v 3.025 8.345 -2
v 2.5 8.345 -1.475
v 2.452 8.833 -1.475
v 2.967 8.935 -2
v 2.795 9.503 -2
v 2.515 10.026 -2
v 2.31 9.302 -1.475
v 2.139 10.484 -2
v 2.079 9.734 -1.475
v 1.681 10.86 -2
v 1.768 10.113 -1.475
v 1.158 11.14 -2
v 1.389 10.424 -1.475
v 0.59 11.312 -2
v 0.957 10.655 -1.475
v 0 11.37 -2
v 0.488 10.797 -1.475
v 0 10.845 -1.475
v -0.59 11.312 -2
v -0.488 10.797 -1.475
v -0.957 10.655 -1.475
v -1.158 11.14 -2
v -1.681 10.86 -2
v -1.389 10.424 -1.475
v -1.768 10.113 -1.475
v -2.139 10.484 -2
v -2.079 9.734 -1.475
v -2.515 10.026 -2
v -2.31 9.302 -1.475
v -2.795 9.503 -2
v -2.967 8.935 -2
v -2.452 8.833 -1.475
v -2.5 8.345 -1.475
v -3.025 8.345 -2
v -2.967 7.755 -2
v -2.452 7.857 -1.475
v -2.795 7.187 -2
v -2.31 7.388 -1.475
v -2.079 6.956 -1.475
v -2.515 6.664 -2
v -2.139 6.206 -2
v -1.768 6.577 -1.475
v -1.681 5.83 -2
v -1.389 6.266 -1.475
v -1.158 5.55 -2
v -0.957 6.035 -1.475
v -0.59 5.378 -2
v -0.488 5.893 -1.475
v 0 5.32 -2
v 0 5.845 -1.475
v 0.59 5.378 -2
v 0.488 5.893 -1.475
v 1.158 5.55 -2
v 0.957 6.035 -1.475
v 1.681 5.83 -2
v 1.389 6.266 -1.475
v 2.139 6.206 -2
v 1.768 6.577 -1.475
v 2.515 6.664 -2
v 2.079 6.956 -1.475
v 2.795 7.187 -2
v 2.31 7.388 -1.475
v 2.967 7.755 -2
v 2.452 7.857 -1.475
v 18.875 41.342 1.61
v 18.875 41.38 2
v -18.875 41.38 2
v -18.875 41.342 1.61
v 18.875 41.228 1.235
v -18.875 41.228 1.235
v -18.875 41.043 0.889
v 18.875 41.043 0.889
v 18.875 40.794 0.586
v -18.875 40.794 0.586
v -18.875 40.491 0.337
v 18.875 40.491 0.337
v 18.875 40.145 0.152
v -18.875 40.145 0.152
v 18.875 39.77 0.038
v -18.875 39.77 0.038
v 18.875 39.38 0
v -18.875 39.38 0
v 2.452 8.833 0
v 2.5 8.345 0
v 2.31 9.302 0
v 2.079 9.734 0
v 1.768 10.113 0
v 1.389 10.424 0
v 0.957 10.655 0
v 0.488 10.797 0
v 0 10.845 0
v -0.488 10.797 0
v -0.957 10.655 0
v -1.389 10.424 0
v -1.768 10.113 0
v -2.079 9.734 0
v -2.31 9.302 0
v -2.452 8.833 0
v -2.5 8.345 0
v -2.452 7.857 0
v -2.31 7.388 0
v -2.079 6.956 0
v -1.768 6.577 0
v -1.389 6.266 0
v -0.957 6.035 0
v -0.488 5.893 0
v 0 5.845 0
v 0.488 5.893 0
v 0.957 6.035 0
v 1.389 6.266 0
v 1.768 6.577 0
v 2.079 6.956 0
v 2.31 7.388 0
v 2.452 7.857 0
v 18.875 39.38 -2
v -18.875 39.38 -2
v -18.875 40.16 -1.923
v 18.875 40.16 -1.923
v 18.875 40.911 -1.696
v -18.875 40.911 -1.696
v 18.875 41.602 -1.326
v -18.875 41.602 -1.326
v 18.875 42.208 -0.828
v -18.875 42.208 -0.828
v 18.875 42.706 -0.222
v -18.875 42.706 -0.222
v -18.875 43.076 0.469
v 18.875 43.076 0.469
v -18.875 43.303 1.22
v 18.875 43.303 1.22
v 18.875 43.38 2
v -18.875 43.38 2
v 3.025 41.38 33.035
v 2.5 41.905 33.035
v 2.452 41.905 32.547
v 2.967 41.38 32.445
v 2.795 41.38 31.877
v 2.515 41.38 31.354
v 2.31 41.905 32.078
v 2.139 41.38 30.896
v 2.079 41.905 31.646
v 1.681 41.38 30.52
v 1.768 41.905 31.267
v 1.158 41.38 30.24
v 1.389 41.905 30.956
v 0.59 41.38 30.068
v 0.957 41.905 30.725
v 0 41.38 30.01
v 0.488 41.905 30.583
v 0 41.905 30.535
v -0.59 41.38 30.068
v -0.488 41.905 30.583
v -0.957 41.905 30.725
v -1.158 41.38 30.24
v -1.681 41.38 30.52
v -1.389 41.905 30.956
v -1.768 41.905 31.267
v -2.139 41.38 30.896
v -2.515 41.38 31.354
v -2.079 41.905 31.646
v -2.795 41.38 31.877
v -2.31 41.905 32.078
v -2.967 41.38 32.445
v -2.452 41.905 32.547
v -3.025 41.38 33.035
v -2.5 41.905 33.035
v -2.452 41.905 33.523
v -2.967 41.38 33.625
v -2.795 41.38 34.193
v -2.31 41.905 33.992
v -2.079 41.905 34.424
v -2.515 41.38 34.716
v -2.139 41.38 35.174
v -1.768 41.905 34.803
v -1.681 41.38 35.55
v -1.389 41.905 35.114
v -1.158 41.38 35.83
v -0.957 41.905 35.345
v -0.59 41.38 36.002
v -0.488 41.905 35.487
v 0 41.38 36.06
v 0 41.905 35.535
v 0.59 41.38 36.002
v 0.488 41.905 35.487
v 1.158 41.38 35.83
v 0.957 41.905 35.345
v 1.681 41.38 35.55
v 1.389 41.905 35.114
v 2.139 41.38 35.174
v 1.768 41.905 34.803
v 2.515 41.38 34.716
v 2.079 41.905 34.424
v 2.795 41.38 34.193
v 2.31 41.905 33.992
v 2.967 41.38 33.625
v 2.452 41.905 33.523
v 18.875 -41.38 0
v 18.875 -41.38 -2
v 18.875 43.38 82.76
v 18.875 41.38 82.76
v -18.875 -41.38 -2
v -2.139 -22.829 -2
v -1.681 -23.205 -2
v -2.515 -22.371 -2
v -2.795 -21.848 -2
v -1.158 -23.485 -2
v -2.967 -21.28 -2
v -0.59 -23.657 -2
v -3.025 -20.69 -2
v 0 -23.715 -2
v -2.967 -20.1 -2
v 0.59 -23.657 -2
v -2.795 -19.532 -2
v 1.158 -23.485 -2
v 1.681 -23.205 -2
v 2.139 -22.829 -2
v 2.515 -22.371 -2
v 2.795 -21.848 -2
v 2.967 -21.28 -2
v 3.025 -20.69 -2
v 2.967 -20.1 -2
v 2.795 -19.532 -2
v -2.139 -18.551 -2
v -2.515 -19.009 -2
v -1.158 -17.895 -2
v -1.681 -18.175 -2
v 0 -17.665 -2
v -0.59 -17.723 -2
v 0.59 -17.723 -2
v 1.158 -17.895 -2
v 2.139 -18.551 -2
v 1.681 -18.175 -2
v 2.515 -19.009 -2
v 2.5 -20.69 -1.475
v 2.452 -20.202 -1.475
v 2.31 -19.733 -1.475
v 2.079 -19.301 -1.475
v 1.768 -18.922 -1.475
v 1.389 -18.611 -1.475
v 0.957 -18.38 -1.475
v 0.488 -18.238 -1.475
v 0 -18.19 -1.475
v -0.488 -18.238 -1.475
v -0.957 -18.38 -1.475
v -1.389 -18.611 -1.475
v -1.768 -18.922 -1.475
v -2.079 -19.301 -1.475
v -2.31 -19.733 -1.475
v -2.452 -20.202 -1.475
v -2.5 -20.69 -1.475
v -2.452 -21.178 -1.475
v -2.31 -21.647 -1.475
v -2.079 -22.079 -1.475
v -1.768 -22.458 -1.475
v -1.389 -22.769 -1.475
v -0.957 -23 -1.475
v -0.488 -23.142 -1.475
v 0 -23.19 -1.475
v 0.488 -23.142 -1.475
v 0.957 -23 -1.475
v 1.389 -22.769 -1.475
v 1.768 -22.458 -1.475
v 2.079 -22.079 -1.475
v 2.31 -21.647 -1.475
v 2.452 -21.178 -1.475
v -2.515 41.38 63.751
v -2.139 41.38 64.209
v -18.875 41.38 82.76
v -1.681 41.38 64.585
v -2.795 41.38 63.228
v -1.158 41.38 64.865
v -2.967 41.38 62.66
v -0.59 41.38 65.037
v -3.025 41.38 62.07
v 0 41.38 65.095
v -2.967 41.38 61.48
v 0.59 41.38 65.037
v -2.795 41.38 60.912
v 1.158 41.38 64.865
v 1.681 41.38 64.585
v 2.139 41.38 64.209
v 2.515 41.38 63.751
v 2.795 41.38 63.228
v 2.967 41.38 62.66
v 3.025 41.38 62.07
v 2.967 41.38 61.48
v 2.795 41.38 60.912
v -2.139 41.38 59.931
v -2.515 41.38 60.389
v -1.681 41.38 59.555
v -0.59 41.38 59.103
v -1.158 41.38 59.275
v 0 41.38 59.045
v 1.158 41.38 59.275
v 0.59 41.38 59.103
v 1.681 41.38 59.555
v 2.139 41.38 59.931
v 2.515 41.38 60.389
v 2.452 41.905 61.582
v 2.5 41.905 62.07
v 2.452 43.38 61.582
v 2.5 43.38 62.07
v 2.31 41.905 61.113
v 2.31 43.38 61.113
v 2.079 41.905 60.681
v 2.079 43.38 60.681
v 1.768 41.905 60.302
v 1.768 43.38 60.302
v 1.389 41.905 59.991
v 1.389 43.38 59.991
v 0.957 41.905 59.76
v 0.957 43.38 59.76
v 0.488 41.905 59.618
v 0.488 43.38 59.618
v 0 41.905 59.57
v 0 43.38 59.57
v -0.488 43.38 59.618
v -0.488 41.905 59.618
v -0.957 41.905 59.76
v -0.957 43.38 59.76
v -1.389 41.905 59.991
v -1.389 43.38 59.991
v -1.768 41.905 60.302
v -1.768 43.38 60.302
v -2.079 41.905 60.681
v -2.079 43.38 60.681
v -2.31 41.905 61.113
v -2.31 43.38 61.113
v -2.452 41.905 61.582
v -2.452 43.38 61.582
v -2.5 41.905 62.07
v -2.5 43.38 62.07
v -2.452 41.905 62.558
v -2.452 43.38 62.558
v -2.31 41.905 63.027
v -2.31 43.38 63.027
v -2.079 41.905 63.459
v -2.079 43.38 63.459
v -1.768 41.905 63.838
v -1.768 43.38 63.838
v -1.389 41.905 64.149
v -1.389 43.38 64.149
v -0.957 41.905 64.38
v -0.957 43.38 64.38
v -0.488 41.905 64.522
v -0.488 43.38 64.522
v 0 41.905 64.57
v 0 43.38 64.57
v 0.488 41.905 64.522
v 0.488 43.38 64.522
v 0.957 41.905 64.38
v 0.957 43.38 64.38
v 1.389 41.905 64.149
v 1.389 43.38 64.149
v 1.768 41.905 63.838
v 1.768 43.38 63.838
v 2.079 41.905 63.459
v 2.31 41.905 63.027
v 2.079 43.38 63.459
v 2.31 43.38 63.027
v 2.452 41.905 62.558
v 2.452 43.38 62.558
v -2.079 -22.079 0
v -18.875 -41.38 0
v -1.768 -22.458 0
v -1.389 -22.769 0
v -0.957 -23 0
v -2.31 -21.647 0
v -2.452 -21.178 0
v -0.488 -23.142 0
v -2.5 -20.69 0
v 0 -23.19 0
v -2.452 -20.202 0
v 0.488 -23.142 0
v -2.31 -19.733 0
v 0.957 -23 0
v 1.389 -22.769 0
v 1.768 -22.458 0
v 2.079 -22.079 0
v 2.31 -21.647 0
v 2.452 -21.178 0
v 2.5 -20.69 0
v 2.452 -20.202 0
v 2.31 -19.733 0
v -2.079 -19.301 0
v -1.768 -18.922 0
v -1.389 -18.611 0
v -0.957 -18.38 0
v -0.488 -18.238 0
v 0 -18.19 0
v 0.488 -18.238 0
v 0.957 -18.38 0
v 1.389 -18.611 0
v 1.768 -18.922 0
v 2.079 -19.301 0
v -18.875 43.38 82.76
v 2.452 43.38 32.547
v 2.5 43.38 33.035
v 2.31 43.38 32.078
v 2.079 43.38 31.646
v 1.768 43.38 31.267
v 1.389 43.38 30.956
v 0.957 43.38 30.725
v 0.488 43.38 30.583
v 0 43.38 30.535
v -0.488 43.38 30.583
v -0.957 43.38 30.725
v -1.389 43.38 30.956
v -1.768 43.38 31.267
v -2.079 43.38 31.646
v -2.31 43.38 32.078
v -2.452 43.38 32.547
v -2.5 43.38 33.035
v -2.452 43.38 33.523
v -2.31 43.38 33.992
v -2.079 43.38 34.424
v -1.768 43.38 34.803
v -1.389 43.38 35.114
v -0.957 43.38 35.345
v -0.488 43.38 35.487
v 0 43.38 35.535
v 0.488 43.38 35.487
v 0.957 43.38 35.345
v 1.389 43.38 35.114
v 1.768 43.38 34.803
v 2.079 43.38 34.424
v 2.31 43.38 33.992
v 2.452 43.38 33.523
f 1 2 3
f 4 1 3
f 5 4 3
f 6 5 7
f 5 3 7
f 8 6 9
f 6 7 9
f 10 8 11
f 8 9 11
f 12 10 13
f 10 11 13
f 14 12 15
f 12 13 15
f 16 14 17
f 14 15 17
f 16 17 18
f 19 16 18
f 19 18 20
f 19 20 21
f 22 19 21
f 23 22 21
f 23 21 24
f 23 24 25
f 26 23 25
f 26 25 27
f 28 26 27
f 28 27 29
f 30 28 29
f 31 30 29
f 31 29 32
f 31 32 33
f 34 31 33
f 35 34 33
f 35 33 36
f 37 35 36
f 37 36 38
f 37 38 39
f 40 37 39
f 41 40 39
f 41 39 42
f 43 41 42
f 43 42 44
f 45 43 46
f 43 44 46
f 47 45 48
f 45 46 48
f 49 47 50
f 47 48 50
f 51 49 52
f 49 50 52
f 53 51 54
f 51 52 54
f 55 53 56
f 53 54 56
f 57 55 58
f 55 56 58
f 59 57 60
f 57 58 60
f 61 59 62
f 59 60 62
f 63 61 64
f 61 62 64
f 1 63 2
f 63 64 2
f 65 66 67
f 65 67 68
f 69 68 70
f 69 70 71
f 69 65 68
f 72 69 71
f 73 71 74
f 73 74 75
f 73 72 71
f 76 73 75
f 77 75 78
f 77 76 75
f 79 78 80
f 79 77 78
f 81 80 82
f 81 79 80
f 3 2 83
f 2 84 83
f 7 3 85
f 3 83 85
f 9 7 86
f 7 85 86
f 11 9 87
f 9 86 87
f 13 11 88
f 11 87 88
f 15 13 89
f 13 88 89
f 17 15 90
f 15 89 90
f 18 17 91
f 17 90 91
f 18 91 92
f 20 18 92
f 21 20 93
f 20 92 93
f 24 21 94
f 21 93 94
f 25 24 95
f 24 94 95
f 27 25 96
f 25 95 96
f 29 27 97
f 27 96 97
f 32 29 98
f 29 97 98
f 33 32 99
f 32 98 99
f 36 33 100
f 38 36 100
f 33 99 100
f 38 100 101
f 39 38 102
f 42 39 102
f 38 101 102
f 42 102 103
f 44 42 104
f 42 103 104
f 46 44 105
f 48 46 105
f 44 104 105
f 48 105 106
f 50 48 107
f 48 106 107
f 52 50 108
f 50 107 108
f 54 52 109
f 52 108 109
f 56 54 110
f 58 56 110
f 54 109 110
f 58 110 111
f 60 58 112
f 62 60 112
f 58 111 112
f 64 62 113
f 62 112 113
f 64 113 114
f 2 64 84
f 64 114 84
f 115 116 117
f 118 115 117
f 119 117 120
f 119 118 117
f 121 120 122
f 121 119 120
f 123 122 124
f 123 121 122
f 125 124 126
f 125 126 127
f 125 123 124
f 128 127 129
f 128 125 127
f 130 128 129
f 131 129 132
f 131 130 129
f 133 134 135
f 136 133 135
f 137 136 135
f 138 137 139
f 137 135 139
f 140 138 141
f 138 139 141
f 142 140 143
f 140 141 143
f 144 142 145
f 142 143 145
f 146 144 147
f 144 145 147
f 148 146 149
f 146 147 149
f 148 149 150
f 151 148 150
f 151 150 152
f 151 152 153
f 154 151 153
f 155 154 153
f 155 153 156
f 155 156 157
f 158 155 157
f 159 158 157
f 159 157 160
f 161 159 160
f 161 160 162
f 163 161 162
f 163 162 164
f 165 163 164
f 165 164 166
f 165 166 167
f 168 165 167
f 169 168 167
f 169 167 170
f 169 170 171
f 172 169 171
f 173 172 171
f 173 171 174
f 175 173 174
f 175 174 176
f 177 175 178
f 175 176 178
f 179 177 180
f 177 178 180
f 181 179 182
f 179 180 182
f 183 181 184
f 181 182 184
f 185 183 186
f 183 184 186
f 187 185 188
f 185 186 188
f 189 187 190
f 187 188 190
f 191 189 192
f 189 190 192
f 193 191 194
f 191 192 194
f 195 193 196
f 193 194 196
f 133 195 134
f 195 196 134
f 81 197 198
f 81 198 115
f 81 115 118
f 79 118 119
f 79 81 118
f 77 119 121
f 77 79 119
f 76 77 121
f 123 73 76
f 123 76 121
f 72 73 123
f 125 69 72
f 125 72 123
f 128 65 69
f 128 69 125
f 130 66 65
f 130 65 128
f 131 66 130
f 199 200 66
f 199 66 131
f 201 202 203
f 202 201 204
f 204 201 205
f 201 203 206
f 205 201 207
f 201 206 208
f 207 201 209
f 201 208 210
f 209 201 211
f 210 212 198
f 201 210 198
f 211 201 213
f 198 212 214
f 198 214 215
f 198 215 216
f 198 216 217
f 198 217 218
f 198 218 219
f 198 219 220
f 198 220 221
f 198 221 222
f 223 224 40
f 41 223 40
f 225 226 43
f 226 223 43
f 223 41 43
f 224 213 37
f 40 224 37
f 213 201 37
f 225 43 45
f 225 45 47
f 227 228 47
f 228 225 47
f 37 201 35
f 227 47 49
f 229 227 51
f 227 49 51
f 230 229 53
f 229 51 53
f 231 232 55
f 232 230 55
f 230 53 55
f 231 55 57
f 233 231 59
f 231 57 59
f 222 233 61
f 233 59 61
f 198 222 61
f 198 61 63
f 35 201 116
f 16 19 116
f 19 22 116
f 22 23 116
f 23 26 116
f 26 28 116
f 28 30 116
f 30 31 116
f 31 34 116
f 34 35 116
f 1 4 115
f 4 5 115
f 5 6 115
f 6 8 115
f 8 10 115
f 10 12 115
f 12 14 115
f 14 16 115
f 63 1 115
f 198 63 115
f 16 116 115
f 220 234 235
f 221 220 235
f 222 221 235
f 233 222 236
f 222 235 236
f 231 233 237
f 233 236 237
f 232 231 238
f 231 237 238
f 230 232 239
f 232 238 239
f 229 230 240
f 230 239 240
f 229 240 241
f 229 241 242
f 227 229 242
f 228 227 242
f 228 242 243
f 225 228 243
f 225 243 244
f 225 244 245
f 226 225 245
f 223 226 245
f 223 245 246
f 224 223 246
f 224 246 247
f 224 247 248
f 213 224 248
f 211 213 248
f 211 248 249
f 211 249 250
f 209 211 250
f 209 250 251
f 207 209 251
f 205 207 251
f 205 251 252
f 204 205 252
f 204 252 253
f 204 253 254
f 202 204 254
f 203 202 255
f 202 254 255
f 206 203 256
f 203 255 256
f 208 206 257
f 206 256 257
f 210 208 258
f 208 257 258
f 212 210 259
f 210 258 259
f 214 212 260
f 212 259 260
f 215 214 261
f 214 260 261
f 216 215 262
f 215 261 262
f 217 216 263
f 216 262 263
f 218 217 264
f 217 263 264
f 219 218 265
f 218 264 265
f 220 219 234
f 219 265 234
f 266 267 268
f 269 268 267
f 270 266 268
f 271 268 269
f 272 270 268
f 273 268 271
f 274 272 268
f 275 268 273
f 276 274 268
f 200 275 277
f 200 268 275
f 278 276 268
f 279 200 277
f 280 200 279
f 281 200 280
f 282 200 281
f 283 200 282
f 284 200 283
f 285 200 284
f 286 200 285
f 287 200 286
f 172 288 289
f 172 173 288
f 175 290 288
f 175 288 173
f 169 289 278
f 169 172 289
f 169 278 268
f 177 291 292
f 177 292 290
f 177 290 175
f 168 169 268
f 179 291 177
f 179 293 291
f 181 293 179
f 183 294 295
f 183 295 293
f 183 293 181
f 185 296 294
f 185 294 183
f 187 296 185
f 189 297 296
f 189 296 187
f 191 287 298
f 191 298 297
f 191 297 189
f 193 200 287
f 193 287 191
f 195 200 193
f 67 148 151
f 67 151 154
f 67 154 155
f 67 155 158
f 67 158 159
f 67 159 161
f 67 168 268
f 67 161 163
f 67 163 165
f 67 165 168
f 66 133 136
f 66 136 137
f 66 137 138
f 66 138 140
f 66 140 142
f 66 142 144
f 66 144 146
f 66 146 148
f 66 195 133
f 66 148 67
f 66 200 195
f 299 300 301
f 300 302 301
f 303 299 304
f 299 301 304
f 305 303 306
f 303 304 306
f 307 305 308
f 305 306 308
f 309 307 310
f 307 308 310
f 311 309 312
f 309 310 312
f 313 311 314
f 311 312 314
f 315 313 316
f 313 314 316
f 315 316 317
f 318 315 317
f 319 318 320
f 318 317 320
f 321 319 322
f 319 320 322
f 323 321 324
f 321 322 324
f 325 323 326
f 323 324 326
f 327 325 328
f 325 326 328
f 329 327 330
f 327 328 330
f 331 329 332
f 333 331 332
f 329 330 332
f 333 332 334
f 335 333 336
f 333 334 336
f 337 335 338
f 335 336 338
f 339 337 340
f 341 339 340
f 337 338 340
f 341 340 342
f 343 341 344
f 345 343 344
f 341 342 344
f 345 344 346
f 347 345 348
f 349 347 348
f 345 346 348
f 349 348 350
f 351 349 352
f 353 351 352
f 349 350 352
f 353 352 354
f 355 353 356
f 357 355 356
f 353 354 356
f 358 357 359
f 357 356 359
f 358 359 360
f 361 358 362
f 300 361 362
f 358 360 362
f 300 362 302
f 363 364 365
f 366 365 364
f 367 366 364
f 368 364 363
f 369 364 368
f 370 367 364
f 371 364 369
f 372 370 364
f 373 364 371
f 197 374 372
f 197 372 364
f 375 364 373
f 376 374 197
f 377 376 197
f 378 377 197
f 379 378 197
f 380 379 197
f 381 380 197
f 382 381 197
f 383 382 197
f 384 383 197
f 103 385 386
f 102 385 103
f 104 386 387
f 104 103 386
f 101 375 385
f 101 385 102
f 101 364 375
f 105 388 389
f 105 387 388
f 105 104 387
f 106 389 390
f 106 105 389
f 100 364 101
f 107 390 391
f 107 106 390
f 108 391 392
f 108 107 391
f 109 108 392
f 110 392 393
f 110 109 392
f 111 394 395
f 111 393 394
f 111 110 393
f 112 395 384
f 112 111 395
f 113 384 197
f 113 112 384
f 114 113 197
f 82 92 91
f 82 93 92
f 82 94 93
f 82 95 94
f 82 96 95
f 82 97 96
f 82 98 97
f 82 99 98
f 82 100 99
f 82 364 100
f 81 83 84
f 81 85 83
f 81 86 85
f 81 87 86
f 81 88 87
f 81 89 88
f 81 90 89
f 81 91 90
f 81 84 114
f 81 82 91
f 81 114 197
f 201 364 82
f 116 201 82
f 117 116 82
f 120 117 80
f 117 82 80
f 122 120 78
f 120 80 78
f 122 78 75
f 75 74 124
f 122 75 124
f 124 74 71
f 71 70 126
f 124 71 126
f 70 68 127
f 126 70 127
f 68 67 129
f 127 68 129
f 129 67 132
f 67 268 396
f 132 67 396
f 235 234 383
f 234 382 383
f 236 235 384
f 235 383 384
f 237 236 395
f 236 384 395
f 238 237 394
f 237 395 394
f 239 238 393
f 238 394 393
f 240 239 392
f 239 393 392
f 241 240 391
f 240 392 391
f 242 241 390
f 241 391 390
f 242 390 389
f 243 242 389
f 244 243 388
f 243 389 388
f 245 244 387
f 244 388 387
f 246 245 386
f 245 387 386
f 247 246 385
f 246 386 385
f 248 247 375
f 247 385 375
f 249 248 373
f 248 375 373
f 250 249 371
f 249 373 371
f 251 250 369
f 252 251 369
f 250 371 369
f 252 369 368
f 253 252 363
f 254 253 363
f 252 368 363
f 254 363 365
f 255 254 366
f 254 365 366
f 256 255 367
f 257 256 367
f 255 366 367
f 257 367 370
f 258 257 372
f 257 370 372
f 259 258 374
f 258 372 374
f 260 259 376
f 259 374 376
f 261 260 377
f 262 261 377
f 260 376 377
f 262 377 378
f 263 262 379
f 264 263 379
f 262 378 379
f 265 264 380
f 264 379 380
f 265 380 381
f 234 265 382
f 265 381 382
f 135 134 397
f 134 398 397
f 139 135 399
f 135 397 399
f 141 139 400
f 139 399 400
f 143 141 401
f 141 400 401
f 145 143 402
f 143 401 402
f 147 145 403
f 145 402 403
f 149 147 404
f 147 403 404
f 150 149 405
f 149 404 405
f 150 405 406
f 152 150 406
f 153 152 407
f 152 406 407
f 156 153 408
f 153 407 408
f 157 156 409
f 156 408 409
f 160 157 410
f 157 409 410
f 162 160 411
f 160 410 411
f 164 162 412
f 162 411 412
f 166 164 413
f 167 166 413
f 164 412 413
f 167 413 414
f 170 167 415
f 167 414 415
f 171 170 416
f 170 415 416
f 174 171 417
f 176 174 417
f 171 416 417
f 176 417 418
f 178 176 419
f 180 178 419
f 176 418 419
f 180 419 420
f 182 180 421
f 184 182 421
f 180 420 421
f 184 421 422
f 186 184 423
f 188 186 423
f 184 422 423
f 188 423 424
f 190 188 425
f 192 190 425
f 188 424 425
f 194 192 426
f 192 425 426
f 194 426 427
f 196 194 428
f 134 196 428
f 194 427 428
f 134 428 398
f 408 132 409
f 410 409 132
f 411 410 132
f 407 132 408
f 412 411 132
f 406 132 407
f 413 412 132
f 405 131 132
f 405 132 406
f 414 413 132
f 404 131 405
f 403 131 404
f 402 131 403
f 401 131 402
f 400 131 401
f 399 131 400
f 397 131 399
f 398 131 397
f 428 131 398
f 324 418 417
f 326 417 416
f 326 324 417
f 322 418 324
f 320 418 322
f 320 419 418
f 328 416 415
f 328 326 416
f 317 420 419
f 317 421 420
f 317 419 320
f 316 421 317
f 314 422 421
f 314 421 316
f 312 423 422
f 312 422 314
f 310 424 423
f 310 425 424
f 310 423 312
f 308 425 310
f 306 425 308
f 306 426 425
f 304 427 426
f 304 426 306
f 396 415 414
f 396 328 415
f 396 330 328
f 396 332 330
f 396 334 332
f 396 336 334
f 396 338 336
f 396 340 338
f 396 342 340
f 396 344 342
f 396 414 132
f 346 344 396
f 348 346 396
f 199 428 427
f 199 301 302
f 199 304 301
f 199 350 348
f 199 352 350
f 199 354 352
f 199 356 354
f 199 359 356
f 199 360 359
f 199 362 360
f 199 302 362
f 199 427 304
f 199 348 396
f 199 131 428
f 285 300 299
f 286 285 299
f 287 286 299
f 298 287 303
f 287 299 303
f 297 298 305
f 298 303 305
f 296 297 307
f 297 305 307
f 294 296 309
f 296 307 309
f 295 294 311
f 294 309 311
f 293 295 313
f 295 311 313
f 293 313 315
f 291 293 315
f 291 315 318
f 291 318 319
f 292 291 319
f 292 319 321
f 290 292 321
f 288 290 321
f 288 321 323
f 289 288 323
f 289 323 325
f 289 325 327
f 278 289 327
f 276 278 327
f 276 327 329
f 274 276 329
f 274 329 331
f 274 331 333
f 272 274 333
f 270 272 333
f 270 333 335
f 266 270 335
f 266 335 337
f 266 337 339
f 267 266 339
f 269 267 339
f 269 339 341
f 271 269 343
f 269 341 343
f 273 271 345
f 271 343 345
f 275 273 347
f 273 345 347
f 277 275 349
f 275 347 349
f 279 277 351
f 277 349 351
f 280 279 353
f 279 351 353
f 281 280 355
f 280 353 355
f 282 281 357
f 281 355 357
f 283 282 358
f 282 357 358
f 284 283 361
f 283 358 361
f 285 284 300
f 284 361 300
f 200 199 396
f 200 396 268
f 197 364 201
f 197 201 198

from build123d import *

# Parameters (mm, degrees)
SKETCH1_W                       = 37.75
SKETCH1_H                       = 82.76
BASE_FLANGE1_DEPTH              = 2
EDGE_FLANGE1_STRIP_W            = 12
EDGE_FLANGE1_STRIP_H            = 2
EDGE_FLANGE1_STRIP_CUT_DEPTH    = 37.75
EDGE_FLANGE1_DEPTH              = 37.75
M6X1_0_TAPPED_HOLE2_D           = 5
M6X1_0_TAPPED_HOLE2_DEPTH       = 15
M6X1_0_TAPPED_HOLE2_CSINK_D     = 6.05
M6X1_0_TAPPED_HOLE2_CSINK_ANGLE = 90
M6X1_0_TAPPED_HOLE2_TIP         = 1.502151548
M6X1_0_TAPPED_HOLE3_D           = 5
M6X1_0_TAPPED_HOLE3_DEPTH       = 15
M6X1_0_TAPPED_HOLE3_CSINK_D     = 6.05
M6X1_0_TAPPED_HOLE3_CSINK_ANGLE = 90
M6X1_0_TAPPED_HOLE3_TIP         = 1.502151548


# Sheet-metal steps are written as plain solids
with BuildPart() as part:
    # Sketch1 → Base-Flange1 (new body)
    with BuildSketch(Plane.XY):
        Rectangle(SKETCH1_W, SKETCH1_H)
    extrude(amount=-BASE_FLANGE1_DEPTH)

    # Edge-Flange1 strip (across the edge) → Edge-Flange1 strip cut (cut)
    with BuildSketch(Plane(origin=(18.875, 41.38, 0), x_dir=(0, -1, 0), z_dir=(-1, 0, 0))):
        with Locations((-4, -1)):
            Rectangle(EDGE_FLANGE1_STRIP_W, EDGE_FLANGE1_STRIP_H)
    extrude(amount=EDGE_FLANGE1_STRIP_CUT_DEPTH, mode=Mode.SUBTRACT)

    # Edge-Flange1 section (across the edge) → Edge-Flange1 (add)
    with BuildSketch(Plane(origin=(18.875, 41.38, 0), x_dir=(0, -1, 0), z_dir=(-1, 0, 0))):
        with BuildLine():
            Line((-2, 2), (-2, 82.76))
            Line((-2, 82.76), (0, 82.76))
            Line((0, 82.76), (0, 2))
            ThreePointArc((0, 2), (0.585786438, 0.585786438), (2, 0))
            Line((2, 0), (2, -2))
            ThreePointArc((2, -2), (-0.828427125, -0.828427125), (-2, 2))
        make_face()
    extrude(amount=EDGE_FLANGE1_DEPTH)

    # M6x1.0 Tapped Hole2
    with Locations(Plane(origin=(0, 0, -2), x_dir=(-1, 0, 0), z_dir=(0, 0, -1))):
        with Locations((0, 8.345), (0, -20.69)):
            CounterSinkHole(M6X1_0_TAPPED_HOLE2_D / 2, M6X1_0_TAPPED_HOLE2_CSINK_D / 2, depth=M6X1_0_TAPPED_HOLE2_DEPTH, counter_sink_angle=M6X1_0_TAPPED_HOLE2_CSINK_ANGLE)
            with Locations((0, 0, -(M6X1_0_TAPPED_HOLE2_DEPTH + M6X1_0_TAPPED_HOLE2_TIP / 2))):  # 118° drill point
                Cone(0, M6X1_0_TAPPED_HOLE2_D / 2, M6X1_0_TAPPED_HOLE2_TIP, mode=Mode.SUBTRACT)

    # M6x1.0 Tapped Hole3
    with Locations(Plane(origin=(0, 41.38, 0), x_dir=(-1, 0, 0), z_dir=(0, -1, 0))):
        with Locations((0, -33.035), (0, -62.07)):
            CounterSinkHole(M6X1_0_TAPPED_HOLE3_D / 2, M6X1_0_TAPPED_HOLE3_CSINK_D / 2, depth=M6X1_0_TAPPED_HOLE3_DEPTH, counter_sink_angle=M6X1_0_TAPPED_HOLE3_CSINK_ANGLE)
            with Locations((0, 0, -(M6X1_0_TAPPED_HOLE3_DEPTH + M6X1_0_TAPPED_HOLE3_TIP / 2))):  # 118° drill point
                Cone(0, M6X1_0_TAPPED_HOLE3_D / 2, M6X1_0_TAPPED_HOLE3_TIP, mode=Mode.SUBTRACT)


solid = part.part
